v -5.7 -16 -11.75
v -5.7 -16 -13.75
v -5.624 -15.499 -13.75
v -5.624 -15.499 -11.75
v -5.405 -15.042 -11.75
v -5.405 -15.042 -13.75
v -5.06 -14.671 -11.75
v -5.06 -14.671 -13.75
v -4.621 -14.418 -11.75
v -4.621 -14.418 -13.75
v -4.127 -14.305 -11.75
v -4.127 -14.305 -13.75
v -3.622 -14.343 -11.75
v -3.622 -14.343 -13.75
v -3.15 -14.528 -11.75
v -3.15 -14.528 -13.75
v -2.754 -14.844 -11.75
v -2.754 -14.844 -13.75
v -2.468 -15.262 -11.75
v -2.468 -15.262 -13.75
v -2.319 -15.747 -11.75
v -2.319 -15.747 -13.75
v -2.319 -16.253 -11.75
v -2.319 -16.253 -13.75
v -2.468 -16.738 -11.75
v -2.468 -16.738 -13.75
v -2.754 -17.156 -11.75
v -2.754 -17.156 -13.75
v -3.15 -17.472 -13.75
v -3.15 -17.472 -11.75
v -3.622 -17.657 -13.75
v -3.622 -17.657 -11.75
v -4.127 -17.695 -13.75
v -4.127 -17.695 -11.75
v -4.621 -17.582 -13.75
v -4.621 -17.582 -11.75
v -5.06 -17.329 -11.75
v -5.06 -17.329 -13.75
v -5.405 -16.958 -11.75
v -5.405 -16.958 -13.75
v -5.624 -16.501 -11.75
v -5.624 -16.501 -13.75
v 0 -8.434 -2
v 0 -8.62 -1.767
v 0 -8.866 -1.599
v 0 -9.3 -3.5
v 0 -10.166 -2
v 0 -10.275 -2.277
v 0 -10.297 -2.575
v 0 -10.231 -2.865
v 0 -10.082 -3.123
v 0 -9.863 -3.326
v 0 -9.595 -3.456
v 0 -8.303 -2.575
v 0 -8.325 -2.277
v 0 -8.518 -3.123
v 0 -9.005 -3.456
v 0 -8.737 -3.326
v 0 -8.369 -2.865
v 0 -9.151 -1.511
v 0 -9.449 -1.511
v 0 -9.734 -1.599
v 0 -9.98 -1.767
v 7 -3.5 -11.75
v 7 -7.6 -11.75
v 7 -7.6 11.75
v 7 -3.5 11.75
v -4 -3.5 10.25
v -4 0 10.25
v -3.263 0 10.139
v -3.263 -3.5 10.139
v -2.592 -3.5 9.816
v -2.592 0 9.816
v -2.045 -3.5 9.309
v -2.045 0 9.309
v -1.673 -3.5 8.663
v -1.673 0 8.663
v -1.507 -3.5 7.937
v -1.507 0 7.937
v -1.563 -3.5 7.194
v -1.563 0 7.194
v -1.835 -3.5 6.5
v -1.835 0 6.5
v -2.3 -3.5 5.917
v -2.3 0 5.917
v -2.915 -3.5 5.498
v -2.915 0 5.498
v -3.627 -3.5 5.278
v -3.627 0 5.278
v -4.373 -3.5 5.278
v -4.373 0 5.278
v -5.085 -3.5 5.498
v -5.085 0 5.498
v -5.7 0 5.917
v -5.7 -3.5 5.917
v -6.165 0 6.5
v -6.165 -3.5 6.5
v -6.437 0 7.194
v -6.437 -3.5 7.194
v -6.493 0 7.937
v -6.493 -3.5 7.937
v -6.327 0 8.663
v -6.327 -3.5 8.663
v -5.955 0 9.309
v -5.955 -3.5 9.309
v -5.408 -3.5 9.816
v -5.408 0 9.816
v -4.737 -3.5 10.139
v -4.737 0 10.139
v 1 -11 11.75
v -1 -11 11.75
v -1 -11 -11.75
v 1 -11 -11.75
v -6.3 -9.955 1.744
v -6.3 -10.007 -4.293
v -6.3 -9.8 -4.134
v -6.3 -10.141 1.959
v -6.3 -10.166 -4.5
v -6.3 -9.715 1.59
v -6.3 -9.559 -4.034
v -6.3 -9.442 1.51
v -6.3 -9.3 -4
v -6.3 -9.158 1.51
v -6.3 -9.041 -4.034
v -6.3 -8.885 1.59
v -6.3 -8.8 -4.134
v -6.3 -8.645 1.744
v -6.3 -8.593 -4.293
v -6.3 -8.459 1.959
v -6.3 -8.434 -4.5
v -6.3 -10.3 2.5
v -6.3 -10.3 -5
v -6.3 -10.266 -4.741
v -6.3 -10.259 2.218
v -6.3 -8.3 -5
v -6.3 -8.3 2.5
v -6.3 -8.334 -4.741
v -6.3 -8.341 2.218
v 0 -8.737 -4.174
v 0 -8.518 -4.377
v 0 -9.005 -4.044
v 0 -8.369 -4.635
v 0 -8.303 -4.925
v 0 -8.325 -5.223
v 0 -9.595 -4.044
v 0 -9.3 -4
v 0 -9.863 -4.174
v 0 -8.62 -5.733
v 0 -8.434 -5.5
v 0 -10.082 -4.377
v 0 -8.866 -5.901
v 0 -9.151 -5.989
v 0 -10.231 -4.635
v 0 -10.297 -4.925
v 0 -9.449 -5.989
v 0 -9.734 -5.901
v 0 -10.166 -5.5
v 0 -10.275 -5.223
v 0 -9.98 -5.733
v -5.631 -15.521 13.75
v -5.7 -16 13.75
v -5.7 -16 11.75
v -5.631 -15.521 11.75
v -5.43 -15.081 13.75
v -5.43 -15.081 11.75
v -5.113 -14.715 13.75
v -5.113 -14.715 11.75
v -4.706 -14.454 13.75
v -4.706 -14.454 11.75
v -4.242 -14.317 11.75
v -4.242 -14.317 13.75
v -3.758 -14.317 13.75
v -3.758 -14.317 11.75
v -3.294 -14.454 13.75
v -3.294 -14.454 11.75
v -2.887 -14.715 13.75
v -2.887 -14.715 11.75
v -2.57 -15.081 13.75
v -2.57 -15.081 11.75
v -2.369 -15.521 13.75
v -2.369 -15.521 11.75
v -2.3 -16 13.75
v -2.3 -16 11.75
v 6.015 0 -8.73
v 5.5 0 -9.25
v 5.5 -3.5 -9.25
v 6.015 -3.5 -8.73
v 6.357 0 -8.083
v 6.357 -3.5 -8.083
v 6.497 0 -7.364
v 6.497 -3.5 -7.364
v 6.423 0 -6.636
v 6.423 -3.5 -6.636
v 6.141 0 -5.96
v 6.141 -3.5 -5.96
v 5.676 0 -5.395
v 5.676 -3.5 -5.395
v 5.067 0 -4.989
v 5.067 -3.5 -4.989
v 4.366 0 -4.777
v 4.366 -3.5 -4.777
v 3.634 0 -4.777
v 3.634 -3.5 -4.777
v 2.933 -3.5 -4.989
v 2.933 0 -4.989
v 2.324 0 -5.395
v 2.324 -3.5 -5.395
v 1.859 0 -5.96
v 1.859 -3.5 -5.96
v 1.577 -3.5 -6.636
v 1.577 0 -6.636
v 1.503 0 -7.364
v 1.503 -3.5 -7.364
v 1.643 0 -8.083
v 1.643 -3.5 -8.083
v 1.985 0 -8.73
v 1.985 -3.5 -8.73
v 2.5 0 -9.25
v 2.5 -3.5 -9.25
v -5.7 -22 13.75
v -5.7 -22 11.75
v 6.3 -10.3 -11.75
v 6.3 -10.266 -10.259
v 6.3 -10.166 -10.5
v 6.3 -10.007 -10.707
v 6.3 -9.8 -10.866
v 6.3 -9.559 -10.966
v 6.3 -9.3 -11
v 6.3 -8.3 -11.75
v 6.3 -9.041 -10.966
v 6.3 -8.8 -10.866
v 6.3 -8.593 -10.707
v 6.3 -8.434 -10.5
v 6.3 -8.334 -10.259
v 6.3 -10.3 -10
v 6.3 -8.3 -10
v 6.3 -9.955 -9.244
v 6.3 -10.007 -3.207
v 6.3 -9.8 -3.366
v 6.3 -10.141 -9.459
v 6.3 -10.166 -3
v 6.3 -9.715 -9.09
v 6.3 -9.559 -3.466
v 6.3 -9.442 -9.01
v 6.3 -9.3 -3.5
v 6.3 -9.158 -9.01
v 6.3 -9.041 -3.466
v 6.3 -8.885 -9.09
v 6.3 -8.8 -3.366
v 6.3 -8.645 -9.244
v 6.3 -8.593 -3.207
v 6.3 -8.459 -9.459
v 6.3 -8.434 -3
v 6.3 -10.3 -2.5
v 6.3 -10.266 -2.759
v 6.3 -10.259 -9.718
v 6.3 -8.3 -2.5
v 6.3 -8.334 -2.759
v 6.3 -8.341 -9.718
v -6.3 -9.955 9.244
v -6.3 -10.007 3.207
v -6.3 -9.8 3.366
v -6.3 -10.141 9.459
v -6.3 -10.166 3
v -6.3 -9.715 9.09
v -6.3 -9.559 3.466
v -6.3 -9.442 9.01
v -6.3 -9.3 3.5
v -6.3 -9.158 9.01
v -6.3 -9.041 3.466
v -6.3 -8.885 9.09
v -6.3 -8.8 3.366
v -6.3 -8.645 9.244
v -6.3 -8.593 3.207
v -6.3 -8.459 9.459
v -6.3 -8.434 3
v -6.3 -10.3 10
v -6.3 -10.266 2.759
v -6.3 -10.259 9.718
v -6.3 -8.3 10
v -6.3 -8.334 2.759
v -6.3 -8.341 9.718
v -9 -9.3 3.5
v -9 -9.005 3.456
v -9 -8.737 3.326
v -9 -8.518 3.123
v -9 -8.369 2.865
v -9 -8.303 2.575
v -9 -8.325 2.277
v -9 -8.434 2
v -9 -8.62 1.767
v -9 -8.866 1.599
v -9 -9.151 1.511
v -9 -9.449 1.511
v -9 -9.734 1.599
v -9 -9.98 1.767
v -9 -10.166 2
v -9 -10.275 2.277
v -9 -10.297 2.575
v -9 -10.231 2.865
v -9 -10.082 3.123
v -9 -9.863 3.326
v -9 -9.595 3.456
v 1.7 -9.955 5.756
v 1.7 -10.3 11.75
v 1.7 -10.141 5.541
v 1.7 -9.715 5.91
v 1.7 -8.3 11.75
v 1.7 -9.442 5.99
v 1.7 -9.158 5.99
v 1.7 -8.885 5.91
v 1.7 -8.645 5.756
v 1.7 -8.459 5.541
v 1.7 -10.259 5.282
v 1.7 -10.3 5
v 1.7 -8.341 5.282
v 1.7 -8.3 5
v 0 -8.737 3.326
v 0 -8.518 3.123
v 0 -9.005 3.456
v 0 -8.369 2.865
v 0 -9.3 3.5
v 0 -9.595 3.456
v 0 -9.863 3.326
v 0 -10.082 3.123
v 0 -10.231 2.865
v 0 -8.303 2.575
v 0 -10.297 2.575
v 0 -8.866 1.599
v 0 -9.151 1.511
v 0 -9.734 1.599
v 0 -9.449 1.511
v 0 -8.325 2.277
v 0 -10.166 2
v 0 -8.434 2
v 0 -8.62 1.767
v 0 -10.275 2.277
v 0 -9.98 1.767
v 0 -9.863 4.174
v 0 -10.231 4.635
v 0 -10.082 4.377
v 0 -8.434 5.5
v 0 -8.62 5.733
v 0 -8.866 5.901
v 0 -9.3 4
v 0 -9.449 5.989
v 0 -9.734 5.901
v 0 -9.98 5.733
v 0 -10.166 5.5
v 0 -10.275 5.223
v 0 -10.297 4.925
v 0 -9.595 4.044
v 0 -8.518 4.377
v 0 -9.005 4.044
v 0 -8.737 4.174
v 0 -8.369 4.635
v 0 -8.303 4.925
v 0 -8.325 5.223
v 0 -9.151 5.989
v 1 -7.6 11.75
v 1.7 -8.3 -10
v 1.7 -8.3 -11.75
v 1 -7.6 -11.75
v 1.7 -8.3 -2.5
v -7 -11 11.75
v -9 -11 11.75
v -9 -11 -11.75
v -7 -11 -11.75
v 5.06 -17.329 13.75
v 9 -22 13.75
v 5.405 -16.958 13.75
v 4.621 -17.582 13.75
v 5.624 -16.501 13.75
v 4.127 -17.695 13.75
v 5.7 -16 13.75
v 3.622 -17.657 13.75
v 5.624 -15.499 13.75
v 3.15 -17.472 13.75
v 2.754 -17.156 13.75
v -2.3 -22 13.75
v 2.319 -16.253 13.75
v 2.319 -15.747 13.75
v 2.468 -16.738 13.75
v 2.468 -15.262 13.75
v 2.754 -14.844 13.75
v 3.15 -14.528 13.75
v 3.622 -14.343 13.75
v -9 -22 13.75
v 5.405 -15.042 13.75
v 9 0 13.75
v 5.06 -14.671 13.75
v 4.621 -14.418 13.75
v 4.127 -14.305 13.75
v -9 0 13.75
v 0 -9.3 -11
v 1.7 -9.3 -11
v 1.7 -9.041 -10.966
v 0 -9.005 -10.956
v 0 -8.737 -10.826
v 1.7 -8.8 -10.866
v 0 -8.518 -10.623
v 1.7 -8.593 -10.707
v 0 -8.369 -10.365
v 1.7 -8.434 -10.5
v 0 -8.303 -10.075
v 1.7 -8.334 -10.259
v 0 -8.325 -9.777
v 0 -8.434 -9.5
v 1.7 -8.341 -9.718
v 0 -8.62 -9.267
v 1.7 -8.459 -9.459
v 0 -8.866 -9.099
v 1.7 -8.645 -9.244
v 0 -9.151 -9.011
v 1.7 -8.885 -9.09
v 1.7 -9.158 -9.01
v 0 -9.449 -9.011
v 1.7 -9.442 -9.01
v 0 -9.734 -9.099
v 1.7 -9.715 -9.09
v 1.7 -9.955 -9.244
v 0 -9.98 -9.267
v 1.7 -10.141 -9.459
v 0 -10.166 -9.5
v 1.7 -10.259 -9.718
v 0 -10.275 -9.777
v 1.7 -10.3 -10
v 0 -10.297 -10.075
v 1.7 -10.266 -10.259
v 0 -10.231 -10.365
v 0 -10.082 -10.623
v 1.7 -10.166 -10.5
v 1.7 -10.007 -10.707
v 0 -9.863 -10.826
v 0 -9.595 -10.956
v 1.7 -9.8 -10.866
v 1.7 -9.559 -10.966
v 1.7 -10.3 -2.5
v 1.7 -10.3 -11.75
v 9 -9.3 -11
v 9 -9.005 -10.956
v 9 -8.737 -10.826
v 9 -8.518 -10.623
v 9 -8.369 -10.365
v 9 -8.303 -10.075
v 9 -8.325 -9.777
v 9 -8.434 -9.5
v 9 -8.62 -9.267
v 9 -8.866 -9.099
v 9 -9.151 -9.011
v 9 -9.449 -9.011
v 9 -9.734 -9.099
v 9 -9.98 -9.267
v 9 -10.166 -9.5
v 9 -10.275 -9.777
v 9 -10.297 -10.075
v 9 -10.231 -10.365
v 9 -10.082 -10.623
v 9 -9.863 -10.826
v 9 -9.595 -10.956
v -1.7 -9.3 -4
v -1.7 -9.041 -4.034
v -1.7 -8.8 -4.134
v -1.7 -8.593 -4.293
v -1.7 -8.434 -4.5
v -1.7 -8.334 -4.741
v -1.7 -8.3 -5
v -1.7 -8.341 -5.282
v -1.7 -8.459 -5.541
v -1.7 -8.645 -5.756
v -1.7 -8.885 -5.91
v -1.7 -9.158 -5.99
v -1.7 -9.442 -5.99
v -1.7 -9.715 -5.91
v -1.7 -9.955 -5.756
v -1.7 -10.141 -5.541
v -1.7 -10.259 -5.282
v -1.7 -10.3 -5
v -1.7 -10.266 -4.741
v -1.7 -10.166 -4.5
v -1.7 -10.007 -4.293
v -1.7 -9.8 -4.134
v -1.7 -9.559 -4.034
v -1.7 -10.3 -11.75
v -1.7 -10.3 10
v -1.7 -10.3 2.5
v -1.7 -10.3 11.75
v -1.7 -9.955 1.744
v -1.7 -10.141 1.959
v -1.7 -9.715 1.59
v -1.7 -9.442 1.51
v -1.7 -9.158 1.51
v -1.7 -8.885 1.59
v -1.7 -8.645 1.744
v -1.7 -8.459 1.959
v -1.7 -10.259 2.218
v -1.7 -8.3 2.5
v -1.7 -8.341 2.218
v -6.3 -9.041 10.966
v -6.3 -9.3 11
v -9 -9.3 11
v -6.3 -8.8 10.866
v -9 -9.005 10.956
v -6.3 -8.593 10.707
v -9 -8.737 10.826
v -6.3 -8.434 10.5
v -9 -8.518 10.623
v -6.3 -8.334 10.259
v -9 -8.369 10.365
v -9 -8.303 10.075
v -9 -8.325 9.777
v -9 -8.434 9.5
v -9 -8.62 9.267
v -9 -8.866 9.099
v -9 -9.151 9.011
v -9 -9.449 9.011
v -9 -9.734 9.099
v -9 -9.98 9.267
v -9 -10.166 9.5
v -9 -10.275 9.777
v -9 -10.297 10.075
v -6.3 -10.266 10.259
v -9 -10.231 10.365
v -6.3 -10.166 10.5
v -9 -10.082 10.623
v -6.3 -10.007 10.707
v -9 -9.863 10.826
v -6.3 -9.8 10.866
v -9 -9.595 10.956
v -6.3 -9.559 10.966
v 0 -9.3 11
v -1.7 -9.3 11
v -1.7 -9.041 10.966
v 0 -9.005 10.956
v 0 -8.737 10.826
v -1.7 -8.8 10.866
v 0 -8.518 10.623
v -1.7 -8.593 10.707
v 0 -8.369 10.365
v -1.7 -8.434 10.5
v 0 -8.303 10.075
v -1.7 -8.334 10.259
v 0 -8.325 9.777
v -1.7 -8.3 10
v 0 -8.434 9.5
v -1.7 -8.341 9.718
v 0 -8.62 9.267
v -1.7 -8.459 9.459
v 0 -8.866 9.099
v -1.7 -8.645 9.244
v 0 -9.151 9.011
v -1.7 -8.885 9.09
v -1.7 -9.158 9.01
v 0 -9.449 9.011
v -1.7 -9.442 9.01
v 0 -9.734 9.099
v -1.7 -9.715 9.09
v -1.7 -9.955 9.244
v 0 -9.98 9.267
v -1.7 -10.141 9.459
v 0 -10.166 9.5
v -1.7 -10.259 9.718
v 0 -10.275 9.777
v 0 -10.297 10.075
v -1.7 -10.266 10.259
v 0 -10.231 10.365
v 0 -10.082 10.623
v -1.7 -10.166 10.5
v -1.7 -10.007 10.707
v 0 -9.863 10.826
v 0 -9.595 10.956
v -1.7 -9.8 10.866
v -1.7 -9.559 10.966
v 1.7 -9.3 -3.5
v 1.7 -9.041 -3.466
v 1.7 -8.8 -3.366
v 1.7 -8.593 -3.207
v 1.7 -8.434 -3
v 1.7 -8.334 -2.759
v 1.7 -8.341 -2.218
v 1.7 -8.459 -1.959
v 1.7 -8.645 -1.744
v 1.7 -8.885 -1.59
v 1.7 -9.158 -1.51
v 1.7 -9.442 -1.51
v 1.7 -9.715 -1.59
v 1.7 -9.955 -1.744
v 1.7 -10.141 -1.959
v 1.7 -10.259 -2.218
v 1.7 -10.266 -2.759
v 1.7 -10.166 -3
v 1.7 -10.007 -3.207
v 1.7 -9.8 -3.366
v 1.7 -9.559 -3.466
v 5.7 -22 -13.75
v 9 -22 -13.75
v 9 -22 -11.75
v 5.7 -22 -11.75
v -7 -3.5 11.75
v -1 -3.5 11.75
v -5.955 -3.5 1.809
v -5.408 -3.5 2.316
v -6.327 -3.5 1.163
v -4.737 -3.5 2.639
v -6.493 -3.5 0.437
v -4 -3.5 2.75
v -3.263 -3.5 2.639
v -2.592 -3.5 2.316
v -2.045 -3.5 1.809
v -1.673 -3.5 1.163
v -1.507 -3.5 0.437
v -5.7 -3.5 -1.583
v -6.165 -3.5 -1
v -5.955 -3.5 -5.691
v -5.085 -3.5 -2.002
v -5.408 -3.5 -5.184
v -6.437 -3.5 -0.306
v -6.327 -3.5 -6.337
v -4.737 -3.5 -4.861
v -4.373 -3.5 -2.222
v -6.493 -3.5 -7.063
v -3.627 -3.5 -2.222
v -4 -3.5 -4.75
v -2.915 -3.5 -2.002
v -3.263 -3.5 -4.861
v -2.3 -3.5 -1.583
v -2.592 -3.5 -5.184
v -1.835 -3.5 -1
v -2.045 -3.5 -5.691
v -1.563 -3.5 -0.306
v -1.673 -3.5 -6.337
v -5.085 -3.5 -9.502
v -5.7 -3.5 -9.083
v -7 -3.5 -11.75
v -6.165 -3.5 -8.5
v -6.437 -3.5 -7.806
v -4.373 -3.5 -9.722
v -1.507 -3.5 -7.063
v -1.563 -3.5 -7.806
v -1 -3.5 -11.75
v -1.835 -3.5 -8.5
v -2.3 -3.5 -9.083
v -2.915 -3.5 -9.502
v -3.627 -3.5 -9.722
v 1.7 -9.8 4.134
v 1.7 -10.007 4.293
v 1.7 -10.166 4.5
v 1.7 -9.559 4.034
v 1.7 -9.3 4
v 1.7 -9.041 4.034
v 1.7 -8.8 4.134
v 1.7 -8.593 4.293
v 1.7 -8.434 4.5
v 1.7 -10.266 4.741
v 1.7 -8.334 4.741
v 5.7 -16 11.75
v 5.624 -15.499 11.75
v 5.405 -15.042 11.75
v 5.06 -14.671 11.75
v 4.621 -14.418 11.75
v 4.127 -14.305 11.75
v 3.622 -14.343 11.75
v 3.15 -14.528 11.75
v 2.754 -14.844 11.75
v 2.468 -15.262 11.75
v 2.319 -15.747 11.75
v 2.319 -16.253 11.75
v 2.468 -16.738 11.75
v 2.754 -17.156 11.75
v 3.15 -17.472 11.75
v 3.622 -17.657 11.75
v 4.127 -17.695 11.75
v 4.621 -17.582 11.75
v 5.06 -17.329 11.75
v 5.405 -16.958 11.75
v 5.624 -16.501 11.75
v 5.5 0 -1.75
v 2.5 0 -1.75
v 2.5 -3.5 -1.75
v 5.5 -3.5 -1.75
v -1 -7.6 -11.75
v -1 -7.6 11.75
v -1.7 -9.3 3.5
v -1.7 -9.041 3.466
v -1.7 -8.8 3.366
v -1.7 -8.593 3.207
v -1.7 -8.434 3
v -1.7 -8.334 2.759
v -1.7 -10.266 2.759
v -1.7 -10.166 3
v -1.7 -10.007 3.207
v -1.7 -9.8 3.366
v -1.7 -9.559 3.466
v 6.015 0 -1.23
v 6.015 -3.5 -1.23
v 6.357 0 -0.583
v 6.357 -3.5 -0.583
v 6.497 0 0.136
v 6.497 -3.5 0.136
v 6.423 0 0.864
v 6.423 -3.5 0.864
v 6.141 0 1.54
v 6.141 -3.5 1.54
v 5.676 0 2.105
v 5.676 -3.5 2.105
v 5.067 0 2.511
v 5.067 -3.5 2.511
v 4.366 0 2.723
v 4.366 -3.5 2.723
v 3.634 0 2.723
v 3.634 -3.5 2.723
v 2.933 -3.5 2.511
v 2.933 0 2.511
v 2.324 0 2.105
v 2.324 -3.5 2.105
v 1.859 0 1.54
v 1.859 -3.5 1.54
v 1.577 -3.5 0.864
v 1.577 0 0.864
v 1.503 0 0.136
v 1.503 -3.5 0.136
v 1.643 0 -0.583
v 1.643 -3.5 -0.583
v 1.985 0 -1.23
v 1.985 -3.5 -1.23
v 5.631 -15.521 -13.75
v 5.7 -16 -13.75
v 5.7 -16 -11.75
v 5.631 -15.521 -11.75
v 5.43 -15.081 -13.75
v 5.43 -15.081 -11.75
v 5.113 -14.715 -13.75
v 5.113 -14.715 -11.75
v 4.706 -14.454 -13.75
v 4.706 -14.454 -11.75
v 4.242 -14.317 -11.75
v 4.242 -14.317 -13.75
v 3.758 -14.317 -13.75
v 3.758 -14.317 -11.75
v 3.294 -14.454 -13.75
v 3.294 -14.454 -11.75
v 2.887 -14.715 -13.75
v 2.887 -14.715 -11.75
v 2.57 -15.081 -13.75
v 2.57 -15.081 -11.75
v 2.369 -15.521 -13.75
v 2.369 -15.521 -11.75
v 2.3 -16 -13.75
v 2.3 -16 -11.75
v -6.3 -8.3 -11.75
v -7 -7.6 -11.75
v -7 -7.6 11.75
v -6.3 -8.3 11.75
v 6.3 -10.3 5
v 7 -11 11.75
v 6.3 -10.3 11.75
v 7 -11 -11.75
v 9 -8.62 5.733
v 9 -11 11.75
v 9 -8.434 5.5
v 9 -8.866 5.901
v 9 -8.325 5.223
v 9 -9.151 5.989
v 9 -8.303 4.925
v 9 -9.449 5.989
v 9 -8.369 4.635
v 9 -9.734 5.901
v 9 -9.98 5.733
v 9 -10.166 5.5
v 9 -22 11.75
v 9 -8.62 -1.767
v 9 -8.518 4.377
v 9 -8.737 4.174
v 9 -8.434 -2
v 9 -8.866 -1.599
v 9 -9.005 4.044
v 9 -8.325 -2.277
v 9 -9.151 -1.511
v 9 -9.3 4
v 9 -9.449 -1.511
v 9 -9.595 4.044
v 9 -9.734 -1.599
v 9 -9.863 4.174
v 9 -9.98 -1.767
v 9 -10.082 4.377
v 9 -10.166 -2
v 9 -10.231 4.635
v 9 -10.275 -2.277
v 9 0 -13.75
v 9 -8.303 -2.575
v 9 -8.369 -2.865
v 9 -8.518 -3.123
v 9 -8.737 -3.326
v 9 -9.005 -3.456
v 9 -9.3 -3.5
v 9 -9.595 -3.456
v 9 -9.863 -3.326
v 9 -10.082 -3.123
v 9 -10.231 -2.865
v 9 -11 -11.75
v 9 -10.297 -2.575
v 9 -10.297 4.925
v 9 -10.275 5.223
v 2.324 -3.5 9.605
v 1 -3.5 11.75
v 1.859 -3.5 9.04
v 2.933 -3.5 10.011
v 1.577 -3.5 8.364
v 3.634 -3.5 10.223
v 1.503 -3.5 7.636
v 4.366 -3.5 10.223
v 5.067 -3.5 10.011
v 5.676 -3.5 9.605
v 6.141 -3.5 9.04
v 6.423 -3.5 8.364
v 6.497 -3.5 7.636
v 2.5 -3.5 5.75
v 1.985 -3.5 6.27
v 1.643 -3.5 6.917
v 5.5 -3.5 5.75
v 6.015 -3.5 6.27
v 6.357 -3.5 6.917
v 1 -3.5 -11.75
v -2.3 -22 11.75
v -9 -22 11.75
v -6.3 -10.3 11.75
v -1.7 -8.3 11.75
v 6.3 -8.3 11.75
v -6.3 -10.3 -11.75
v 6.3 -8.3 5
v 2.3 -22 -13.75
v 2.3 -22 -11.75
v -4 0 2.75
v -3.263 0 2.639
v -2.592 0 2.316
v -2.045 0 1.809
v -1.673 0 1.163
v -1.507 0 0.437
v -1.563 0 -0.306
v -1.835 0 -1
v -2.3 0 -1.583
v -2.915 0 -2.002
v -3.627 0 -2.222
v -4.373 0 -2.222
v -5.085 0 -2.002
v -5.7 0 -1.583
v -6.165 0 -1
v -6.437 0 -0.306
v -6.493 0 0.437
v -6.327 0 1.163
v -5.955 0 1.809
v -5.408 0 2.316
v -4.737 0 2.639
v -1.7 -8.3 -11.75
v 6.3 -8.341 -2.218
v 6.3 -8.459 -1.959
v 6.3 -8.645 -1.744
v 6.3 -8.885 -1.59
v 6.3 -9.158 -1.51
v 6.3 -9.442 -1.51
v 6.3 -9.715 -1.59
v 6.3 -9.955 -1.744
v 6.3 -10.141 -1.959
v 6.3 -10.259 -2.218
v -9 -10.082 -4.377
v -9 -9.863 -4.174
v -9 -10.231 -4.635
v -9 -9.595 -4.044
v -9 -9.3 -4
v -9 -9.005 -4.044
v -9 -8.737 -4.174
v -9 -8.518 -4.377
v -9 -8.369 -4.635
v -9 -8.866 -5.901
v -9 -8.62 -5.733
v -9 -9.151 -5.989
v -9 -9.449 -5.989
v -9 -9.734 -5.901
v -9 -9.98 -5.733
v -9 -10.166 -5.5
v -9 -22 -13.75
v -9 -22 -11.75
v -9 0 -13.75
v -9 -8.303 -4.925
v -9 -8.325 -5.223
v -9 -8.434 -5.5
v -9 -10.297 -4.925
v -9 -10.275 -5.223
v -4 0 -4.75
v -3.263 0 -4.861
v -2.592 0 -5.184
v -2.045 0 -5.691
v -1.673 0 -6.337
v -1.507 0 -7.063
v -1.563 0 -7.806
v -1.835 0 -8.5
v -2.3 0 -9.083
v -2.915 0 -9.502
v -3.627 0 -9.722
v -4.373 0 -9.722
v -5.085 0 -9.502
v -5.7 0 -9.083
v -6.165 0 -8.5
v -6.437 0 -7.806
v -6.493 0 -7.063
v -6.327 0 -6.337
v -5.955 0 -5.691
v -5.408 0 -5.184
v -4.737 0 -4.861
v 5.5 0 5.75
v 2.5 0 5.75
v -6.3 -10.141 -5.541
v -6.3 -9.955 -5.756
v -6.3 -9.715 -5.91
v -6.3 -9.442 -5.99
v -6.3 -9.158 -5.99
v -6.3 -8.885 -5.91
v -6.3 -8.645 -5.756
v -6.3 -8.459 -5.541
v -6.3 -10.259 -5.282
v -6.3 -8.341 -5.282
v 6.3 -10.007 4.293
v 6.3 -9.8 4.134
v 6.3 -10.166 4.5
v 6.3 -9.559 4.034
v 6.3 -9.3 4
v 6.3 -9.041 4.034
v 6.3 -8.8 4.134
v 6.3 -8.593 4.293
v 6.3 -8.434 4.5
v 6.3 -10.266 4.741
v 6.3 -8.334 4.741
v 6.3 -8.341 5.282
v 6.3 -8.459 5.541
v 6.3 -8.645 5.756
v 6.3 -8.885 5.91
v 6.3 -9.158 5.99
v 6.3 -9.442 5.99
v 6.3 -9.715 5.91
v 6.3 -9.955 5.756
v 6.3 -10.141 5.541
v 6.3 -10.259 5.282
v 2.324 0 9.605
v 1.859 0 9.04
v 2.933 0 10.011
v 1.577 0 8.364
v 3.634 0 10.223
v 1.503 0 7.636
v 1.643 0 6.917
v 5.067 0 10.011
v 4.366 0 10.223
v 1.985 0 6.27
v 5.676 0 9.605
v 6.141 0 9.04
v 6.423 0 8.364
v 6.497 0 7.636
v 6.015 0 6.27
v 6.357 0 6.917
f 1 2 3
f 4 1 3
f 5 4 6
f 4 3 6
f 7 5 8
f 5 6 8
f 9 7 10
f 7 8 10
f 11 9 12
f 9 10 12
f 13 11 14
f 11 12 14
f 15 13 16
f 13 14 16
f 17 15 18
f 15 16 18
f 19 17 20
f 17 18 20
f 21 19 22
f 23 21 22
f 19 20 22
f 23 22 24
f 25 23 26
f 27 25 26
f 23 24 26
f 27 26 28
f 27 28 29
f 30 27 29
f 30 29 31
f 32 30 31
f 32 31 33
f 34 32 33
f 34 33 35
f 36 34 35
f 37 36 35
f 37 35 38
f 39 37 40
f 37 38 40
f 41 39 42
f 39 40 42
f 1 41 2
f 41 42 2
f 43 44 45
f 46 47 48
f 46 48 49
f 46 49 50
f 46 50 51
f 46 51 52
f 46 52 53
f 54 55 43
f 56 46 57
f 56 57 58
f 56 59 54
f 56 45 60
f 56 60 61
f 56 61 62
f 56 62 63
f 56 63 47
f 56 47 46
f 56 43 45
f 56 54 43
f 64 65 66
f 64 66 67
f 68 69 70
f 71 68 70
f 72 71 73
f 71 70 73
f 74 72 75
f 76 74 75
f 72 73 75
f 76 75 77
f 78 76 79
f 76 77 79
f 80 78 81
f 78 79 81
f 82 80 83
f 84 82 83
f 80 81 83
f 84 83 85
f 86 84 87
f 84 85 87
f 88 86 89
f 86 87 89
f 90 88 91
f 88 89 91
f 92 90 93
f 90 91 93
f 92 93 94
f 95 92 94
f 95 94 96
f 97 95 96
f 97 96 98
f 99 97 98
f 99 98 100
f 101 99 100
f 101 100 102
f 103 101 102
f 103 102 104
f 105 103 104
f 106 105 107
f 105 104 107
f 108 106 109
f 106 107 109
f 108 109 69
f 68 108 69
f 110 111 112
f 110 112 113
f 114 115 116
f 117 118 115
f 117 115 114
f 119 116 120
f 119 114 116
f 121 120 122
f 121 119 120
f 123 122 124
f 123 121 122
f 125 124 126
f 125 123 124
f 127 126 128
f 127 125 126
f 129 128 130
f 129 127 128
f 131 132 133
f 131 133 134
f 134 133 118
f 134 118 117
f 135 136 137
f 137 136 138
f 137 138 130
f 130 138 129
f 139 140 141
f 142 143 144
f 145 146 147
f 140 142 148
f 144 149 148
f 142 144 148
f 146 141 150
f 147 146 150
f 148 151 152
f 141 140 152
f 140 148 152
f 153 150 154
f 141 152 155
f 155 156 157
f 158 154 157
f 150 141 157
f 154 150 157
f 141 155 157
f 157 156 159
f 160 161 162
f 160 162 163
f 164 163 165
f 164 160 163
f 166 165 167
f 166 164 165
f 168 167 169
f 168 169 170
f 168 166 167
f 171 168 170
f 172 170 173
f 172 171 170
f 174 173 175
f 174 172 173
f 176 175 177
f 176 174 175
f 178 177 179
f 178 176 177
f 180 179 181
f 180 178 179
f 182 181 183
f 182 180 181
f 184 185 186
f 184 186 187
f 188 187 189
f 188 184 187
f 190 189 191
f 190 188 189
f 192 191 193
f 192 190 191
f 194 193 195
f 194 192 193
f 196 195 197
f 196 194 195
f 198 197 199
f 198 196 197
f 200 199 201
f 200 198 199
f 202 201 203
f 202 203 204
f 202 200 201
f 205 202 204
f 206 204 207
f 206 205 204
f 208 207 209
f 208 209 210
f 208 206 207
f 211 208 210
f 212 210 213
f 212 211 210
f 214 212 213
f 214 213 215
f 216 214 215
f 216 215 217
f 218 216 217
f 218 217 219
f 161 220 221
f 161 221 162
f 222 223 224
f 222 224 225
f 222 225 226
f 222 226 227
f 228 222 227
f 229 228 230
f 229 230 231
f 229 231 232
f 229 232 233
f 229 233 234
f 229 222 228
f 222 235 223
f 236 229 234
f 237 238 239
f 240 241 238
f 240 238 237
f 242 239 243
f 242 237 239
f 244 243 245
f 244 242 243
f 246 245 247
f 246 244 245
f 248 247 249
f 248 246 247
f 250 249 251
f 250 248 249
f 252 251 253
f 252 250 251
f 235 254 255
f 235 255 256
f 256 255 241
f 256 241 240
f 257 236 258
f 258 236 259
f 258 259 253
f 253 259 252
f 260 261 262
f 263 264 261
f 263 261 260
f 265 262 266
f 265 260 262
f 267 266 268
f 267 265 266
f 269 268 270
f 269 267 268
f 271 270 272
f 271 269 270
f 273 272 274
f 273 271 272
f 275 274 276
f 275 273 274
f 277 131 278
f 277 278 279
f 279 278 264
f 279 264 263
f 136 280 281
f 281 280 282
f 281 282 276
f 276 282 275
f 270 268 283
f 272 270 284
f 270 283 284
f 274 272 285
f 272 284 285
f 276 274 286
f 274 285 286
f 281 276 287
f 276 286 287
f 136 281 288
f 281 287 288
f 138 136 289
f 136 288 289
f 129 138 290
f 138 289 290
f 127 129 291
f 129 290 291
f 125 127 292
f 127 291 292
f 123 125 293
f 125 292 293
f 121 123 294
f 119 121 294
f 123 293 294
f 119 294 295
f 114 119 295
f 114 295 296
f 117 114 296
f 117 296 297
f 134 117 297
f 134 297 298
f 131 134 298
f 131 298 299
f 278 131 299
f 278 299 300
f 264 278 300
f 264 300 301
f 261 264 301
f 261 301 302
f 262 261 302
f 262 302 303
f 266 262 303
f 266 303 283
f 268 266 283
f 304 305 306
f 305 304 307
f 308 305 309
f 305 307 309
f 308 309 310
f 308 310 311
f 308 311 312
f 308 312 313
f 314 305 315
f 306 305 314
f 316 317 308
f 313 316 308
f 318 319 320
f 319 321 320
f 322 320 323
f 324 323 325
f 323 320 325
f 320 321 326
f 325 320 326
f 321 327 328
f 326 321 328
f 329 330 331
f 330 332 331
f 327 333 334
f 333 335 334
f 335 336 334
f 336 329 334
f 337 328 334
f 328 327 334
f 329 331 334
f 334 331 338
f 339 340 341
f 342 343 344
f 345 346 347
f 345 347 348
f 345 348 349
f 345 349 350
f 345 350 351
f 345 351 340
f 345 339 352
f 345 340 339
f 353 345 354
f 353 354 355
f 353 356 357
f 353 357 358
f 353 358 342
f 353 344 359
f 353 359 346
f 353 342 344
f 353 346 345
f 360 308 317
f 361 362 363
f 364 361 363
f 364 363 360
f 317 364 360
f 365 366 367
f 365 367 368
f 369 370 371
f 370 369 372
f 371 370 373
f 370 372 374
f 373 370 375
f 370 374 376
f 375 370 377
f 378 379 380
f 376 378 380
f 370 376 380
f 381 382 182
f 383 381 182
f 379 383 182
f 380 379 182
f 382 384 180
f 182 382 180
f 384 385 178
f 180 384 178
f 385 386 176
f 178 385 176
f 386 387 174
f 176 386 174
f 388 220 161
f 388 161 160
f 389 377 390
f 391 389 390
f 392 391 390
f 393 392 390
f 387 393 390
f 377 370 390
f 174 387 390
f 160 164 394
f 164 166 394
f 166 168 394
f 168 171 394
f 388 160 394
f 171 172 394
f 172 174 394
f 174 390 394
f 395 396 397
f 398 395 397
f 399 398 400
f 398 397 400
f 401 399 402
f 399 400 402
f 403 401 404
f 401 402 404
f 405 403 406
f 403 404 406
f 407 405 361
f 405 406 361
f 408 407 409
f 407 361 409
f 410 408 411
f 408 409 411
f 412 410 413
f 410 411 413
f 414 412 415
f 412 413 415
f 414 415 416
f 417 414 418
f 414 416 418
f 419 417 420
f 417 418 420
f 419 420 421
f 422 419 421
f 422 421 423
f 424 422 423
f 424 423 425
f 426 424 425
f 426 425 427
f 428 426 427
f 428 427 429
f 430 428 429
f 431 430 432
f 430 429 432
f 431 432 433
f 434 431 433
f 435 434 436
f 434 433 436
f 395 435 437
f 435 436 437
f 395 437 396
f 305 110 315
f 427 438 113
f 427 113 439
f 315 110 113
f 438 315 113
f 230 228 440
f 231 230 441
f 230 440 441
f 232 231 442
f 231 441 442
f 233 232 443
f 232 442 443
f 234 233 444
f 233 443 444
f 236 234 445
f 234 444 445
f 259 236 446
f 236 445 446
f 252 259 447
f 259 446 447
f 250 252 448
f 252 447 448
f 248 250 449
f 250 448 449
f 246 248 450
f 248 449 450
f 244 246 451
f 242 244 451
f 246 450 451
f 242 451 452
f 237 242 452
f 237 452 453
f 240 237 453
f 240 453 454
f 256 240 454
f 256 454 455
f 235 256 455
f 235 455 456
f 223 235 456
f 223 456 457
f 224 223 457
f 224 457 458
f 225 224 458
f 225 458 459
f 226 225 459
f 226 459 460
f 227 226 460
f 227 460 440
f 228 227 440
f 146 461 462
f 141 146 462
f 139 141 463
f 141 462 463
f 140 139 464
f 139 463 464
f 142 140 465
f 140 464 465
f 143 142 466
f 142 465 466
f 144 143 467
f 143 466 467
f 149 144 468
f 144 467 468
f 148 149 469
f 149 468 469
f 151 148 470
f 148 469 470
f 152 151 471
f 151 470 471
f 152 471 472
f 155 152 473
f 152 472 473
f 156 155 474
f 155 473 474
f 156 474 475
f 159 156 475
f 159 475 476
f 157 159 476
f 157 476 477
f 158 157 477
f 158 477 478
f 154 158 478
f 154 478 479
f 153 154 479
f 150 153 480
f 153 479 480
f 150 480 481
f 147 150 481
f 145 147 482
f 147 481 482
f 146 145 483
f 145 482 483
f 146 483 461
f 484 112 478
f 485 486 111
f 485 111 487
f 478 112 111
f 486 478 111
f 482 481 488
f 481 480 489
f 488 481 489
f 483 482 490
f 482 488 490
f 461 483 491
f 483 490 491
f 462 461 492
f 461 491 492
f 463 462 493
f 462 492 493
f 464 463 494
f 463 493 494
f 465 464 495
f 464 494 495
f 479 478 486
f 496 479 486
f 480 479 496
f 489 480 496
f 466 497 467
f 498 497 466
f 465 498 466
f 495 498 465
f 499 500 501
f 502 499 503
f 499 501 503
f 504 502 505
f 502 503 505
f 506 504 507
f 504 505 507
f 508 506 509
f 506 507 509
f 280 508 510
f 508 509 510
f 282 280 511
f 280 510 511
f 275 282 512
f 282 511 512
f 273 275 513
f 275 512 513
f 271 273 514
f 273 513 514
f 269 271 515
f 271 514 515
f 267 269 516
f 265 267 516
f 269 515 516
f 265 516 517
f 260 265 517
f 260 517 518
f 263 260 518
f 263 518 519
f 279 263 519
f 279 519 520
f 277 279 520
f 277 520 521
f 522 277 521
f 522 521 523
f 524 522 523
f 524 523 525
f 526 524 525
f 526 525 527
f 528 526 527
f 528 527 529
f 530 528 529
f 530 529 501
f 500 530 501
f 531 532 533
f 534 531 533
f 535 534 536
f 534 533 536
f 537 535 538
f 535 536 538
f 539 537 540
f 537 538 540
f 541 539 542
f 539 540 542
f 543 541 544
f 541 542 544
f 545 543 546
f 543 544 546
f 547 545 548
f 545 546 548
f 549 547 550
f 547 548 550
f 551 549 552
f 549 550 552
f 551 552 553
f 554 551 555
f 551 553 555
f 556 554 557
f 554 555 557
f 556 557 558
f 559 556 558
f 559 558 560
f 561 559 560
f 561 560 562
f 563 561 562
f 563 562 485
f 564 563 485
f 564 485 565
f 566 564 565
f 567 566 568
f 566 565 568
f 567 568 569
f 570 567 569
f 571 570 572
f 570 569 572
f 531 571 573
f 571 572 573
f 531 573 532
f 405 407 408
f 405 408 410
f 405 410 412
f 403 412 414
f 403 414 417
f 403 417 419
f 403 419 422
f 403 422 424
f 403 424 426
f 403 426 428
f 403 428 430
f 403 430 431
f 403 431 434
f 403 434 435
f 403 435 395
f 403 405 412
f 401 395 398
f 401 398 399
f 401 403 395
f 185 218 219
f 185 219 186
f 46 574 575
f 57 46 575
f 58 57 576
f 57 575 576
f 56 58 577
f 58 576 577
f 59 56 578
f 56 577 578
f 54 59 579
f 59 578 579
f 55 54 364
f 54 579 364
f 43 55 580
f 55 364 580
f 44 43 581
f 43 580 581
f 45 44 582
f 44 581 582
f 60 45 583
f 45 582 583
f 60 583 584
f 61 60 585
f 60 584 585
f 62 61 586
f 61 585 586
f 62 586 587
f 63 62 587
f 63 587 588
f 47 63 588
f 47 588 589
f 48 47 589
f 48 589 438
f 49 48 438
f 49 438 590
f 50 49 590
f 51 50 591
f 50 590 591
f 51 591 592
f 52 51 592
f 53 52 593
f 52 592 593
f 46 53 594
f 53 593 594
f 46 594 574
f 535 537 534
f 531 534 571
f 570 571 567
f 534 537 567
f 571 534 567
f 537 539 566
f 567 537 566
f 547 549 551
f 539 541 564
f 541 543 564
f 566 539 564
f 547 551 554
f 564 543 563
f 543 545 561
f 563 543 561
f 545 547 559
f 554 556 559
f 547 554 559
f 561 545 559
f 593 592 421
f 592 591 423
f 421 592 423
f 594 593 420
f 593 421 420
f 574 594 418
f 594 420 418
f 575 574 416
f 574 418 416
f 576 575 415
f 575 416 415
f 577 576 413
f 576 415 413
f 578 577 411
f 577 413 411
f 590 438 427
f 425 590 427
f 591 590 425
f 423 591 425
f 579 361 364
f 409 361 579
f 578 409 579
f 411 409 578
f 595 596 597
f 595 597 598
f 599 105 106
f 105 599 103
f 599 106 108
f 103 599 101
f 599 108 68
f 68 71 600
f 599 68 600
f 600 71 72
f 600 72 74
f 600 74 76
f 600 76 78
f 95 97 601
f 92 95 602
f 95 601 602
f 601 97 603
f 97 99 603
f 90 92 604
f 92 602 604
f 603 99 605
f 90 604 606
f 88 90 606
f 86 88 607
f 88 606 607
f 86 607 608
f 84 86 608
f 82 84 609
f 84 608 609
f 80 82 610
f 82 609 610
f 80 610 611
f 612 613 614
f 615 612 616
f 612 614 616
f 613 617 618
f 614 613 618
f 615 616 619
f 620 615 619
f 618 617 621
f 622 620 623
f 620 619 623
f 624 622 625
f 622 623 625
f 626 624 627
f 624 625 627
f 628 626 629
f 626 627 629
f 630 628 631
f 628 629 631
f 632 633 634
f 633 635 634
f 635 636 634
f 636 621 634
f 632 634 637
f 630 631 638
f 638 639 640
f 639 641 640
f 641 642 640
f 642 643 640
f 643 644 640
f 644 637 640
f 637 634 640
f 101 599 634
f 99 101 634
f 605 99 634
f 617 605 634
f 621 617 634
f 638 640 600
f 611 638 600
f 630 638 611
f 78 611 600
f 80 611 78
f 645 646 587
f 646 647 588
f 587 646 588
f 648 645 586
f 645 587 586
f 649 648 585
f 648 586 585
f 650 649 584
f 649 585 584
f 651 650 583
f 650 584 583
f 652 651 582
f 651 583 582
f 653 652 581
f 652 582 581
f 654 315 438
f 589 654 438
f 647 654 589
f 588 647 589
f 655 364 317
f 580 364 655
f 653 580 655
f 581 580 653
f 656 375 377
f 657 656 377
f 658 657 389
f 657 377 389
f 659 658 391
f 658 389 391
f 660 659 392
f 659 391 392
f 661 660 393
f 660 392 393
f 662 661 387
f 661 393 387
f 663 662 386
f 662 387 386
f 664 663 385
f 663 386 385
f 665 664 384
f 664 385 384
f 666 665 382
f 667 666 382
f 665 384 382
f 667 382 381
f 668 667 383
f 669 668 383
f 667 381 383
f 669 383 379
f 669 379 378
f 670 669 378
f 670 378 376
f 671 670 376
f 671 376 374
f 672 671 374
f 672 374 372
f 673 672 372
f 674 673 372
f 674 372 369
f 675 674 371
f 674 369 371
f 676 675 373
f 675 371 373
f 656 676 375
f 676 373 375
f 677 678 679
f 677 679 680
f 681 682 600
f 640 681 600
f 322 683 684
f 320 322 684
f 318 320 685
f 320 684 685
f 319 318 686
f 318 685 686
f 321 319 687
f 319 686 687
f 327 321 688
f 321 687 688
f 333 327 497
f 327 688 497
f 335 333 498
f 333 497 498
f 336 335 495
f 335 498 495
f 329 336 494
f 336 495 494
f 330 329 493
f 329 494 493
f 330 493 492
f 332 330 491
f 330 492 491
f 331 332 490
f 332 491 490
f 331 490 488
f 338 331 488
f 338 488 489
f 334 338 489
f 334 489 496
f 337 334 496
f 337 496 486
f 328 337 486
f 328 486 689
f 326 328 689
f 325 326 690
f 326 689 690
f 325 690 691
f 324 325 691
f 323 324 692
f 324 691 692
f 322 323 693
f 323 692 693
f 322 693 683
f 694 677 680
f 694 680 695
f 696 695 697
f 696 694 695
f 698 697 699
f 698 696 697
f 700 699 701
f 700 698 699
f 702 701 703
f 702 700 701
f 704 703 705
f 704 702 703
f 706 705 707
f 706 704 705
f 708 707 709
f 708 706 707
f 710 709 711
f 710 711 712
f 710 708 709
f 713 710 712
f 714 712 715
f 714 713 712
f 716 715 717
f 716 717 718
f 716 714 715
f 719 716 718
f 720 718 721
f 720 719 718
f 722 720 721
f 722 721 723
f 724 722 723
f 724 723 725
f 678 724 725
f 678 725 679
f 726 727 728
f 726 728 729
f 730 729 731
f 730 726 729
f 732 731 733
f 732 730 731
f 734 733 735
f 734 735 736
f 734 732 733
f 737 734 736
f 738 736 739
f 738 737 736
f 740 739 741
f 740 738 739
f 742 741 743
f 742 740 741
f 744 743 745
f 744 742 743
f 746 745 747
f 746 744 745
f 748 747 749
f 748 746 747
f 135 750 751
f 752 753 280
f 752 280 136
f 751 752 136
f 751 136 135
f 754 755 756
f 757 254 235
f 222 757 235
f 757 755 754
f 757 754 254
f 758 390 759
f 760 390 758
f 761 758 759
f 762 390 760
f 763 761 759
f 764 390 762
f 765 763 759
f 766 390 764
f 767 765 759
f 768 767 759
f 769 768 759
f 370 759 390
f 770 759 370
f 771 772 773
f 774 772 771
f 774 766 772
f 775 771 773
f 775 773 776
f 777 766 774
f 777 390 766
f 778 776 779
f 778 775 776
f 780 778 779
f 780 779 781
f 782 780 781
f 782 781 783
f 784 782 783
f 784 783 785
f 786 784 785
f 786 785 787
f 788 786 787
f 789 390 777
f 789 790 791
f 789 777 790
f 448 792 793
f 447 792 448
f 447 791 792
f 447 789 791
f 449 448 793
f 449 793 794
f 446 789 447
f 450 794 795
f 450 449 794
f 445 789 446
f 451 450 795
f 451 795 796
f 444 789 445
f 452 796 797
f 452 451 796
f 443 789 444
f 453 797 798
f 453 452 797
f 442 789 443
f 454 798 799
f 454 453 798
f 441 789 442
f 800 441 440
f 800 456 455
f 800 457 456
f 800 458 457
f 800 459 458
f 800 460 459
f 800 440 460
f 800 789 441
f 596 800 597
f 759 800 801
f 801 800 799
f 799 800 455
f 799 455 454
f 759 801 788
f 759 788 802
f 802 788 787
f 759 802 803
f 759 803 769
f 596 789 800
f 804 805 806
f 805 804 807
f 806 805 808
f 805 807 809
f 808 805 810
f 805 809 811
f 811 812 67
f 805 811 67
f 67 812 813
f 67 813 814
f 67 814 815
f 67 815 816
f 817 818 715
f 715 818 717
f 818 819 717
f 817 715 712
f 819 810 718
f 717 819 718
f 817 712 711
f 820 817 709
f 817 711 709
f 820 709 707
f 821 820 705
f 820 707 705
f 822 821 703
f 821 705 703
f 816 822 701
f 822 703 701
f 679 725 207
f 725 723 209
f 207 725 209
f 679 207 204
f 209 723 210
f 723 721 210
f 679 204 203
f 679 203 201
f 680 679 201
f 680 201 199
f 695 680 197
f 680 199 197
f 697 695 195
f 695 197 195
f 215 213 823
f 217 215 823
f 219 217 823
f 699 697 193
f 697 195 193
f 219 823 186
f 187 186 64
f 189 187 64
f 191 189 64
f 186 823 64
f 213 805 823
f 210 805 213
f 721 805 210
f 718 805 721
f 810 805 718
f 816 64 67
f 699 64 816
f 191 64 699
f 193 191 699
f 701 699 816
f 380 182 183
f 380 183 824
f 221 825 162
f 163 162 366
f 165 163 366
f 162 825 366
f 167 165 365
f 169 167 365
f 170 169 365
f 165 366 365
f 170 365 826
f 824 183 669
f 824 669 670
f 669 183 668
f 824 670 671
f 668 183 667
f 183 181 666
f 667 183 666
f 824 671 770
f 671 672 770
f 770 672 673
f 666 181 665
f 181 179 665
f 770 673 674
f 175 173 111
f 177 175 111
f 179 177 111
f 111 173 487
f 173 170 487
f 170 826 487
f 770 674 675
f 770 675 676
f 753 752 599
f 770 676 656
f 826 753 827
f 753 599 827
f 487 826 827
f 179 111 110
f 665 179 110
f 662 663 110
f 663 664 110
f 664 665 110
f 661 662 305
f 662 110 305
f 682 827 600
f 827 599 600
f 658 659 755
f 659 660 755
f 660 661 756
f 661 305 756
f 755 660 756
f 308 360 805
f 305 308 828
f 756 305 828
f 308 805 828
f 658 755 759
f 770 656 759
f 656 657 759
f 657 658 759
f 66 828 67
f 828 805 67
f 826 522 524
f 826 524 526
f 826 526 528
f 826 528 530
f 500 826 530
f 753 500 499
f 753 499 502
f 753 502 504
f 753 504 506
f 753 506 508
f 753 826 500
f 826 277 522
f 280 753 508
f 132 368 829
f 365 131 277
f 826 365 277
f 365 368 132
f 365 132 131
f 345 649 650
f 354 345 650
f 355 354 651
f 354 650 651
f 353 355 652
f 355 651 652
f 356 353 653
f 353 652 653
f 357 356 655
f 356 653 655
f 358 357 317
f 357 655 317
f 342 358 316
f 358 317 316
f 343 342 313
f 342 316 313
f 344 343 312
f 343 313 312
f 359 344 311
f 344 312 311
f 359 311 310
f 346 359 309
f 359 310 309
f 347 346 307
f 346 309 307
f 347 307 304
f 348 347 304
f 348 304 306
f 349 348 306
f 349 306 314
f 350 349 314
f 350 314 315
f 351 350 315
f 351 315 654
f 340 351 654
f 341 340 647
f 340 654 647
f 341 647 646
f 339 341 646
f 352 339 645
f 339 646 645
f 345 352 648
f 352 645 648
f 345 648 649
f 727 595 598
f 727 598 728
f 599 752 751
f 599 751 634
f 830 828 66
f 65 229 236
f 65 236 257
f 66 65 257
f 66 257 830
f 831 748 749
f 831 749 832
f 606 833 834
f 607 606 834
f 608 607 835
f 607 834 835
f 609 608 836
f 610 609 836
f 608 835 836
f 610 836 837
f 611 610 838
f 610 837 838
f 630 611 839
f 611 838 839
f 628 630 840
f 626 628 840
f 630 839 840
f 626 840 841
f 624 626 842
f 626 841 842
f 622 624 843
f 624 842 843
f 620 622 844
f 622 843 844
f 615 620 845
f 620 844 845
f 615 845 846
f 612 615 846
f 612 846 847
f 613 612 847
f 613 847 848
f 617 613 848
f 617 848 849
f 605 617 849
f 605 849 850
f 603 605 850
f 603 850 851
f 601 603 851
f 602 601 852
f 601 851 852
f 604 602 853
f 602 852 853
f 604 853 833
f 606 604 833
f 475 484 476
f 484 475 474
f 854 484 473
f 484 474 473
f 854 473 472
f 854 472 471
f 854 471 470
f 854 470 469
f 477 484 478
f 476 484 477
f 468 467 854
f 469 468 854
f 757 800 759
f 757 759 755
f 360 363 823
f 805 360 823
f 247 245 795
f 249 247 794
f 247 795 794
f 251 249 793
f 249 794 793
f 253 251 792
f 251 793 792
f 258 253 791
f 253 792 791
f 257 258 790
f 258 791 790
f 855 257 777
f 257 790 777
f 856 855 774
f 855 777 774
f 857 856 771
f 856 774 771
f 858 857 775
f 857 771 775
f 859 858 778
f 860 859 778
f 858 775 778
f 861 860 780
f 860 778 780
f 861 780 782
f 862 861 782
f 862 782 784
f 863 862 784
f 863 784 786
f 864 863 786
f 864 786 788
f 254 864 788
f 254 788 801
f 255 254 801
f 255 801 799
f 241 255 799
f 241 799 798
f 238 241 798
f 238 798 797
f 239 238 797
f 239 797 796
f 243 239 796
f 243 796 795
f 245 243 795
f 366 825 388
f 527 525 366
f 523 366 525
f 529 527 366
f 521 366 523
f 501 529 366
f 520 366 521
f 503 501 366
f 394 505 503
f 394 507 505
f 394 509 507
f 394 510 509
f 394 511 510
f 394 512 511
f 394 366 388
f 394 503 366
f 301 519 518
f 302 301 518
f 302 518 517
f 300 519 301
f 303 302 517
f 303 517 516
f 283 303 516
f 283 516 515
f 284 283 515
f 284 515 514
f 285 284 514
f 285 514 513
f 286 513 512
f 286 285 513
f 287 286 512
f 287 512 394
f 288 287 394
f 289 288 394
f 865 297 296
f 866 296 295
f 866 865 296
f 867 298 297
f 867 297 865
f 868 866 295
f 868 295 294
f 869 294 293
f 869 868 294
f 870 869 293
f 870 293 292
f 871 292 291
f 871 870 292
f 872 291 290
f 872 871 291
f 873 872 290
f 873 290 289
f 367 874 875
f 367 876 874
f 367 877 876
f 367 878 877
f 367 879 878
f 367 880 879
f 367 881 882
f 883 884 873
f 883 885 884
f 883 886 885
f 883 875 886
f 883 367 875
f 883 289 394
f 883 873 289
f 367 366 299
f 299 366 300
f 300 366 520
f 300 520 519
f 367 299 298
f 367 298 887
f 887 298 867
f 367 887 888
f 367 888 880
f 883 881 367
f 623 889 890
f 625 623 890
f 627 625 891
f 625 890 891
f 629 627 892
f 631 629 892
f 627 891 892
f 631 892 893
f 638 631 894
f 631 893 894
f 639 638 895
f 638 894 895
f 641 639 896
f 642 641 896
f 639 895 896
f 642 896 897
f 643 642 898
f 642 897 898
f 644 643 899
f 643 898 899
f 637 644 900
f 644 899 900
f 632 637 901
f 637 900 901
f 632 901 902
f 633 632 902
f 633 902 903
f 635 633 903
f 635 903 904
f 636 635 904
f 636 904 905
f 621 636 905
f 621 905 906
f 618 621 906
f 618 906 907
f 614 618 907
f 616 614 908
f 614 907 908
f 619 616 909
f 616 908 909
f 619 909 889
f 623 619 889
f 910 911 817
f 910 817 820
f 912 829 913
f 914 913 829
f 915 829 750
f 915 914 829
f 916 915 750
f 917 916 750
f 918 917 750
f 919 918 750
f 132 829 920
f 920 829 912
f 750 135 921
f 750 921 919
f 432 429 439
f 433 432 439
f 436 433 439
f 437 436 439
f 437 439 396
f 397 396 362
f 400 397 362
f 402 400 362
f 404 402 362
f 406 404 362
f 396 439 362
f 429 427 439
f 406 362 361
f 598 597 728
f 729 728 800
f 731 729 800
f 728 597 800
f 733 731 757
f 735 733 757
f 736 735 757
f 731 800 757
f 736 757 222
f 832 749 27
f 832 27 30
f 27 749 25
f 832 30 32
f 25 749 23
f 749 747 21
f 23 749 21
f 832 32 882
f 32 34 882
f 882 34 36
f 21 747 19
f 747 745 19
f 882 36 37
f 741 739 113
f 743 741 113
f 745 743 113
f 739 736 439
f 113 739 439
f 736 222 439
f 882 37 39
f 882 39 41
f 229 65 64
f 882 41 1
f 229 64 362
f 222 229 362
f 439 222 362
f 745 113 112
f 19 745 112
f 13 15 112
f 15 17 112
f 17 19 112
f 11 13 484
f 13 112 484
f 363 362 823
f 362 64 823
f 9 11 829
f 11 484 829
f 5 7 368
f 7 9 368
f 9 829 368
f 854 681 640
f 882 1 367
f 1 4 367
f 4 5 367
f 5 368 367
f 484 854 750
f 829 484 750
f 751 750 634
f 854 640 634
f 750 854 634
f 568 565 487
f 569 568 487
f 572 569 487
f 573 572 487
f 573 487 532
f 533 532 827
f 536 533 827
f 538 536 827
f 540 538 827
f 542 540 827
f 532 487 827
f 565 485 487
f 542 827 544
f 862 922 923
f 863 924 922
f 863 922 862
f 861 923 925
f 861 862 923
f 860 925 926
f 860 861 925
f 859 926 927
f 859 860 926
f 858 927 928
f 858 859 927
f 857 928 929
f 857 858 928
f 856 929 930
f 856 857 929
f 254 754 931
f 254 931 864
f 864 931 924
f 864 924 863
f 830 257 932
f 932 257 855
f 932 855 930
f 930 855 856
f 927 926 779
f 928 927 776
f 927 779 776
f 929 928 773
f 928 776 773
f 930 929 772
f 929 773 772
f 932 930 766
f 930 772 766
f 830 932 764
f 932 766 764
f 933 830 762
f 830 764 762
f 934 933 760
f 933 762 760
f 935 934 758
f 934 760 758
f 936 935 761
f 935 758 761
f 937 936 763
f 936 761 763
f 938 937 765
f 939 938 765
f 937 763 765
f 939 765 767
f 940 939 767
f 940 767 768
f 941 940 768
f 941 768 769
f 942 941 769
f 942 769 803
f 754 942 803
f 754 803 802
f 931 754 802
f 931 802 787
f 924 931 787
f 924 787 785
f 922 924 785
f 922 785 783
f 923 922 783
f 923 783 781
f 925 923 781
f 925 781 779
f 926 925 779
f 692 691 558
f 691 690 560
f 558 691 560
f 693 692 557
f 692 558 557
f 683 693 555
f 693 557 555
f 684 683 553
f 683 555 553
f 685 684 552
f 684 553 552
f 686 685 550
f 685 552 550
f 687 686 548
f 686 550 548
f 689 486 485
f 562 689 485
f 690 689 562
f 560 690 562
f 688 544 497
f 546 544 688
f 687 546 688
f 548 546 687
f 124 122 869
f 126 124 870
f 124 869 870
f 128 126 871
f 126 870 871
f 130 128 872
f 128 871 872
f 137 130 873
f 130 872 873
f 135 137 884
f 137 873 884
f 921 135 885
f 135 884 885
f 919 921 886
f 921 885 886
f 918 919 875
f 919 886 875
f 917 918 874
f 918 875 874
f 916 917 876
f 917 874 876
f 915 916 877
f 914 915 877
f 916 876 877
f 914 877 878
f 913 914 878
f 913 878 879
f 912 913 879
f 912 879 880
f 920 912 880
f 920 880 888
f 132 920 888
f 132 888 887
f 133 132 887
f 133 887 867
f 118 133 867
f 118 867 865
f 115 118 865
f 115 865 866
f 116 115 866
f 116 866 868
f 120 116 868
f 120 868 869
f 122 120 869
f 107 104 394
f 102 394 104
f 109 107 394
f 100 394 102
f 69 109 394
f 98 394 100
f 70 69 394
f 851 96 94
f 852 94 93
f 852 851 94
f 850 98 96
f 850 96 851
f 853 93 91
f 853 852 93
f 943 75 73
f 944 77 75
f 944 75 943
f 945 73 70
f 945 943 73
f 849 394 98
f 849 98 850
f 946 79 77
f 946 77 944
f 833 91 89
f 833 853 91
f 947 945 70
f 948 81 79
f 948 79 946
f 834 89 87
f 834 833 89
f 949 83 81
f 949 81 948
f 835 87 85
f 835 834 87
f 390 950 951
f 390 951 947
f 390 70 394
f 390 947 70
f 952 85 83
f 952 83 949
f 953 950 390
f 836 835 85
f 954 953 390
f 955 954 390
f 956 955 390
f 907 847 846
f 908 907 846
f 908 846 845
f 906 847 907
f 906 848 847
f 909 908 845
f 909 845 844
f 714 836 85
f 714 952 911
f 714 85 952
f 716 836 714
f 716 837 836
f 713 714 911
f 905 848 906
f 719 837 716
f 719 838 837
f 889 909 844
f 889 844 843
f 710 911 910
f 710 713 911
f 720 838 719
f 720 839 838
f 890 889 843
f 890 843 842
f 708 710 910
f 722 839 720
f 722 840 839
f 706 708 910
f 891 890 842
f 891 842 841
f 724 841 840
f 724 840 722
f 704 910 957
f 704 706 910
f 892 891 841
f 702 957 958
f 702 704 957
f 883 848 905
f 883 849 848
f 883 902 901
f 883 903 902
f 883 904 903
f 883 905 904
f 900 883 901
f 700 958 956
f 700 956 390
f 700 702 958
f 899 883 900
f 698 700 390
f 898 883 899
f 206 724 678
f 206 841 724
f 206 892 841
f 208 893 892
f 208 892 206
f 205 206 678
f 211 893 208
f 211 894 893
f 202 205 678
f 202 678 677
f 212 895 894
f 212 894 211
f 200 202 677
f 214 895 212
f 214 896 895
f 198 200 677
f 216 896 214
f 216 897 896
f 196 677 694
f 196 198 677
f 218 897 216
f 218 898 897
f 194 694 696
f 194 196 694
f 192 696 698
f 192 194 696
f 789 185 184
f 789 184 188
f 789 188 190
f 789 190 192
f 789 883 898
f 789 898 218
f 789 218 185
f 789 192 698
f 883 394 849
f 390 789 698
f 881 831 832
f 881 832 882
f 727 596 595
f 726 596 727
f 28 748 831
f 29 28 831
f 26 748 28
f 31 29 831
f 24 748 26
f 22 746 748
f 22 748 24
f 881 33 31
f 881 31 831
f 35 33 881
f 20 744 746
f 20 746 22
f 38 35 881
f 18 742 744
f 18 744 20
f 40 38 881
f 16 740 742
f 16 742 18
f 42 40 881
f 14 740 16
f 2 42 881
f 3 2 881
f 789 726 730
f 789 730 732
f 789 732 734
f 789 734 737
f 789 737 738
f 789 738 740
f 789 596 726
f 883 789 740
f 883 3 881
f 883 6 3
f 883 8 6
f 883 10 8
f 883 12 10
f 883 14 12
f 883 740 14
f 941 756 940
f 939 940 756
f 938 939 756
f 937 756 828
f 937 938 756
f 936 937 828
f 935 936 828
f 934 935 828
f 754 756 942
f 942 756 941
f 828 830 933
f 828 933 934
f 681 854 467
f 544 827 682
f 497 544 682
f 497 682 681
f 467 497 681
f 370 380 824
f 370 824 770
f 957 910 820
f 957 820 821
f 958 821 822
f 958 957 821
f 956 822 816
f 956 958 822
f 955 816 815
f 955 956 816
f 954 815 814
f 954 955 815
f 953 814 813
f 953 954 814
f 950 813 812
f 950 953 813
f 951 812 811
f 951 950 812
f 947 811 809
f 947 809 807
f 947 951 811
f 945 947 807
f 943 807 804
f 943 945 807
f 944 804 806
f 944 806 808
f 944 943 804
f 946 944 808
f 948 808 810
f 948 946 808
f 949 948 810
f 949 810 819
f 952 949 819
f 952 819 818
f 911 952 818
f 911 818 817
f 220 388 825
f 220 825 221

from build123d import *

# Parameters (mm, degrees)
SKETCH_1_W               = 18
SKETCH_1_H               = 27.5
SKETCH_1_R               = 2.5
TOP_SURFACE_DEPTH        = 3.5
SKETCH_2_R               = 1.7
FRONT_WALL_DEPTH         = 2
PATTERN_CIRCULAR_1_COUNT = 2
SIDE_RAILS_DEPTH         = 27.5
SKETCH_4_R               = 1
SEPARATORS_CUTOUTS_DEPTH = 9
PATTERN_CIRCULAR_5_COUNT = 2


with BuildPart() as part:
    # Эскиз1 → top-surface (new body)
    with BuildSketch(Plane(origin=(0, 0, 0), x_dir=(1, 0, 0), z_dir=(0, 1, 0))):
        Rectangle(SKETCH_1_W, SKETCH_1_H)
        with Locations(Location((-4, 7.25, 0), (0, 0, 270))):
            Circle(SKETCH_1_R, mode=Mode.SUBTRACT)
        with Locations(Location((-4, -0.25, 0), (0, 0, 270))):
            Circle(SKETCH_1_R, mode=Mode.SUBTRACT)
        with Locations(Location((-4, -7.75, 0), (0, 0, 270))):
            Circle(SKETCH_1_R, mode=Mode.SUBTRACT)
        with BuildLine():
            Line((2.5, 9.25), (5.5, 9.25))
            ThreePointArc((5.5, 9.25), (4, 4.75), (2.5, 9.25))
        make_face(mode=Mode.SUBTRACT)
        with BuildLine():
            Line((2.5, 1.75), (5.5, 1.75))
            ThreePointArc((5.5, 1.75), (4, -2.75), (2.5, 1.75))
        make_face(mode=Mode.SUBTRACT)
        with BuildLine():
            Line((2.5, -5.75), (5.5, -5.75))
            ThreePointArc((5.5, -5.75), (4, -10.25), (2.5, -5.75))
        make_face(mode=Mode.SUBTRACT)
    extrude(amount=-TOP_SURFACE_DEPTH)

    # Эскиз2 → front-wall (add)
    with BuildSketch(Plane.XY.offset(13.75)):
        with BuildLine():
            Line((9, -3.5), (-9, -3.5))
            Line((-9, -3.5), (-9, -22))
            Line((-9, -22), (-5.7, -22))
            Line((-5.7, -22), (-5.7, -16))
            ThreePointArc((-5.7, -16), (-4, -14.3), (-2.3, -16))
            Line((-2.3, -16), (-2.3, -22))
            Line((-2.3, -22), (9, -22))
            Line((9, -22), (9, -3.5))
        make_face()
        with Locations((4, -16)):
            Circle(SKETCH_2_R, mode=Mode.SUBTRACT)
    front_wall = extrude(amount=-FRONT_WALL_DEPTH)

    # Круговой массив1: front-wall ×2 about axis
    pattern_circular_1_axis = Axis((0, 0, 0), (0, 1, 0))
    for i in range(1, PATTERN_CIRCULAR_1_COUNT):
        add(front_wall.rotate(pattern_circular_1_axis, i * 360 / PATTERN_CIRCULAR_1_COUNT))

    # Эскиз5 → side-rails (add)
    with BuildSketch(Plane.XY.offset(13.75)):
        Polygon((-9, -1.5), (-9, -11), (-7, -11), (-6.3, -10.3), (-6.3, -8.3), (-7, -7.6), (-7, -1.5), align=None)
        Polygon((-1.7, -8.3), (-1, -7.6), (-1, -1.5), (0, -1.5), (0, -11), (-1, -11), (-1.7, -10.3), align=None)
    side_rails = extrude(amount=-SIDE_RAILS_DEPTH)

    # Эскиз4 → separators-cutouts (cut)
    with BuildSketch(Plane.ZY.offset(9)):
        with Locations((-5, -9.3)):
            Circle(SKETCH_4_R)
        with Locations((2.5, -9.3)):
            Circle(SKETCH_4_R)
        with Locations((10, -9.3)):
            Circle(SKETCH_4_R)
    separators_cutouts = extrude(amount=-SEPARATORS_CUTOUTS_DEPTH, mode=Mode.SUBTRACT)

    # Круговой массив5: side-rails, separators-cutouts ×2 about axis
    pattern_circular_5_axis = Axis((0, 0, 0), (0, 1, 0))
    add([side_rails.rotate(pattern_circular_5_axis, i * 360 / PATTERN_CIRCULAR_5_COUNT) for i in range(1, PATTERN_CIRCULAR_5_COUNT)])
    add([separators_cutouts.rotate(pattern_circular_5_axis, i * 360 / PATTERN_CIRCULAR_5_COUNT) for i in range(1, PATTERN_CIRCULAR_5_COUNT)], mode=Mode.SUBTRACT)


solid = part.part
